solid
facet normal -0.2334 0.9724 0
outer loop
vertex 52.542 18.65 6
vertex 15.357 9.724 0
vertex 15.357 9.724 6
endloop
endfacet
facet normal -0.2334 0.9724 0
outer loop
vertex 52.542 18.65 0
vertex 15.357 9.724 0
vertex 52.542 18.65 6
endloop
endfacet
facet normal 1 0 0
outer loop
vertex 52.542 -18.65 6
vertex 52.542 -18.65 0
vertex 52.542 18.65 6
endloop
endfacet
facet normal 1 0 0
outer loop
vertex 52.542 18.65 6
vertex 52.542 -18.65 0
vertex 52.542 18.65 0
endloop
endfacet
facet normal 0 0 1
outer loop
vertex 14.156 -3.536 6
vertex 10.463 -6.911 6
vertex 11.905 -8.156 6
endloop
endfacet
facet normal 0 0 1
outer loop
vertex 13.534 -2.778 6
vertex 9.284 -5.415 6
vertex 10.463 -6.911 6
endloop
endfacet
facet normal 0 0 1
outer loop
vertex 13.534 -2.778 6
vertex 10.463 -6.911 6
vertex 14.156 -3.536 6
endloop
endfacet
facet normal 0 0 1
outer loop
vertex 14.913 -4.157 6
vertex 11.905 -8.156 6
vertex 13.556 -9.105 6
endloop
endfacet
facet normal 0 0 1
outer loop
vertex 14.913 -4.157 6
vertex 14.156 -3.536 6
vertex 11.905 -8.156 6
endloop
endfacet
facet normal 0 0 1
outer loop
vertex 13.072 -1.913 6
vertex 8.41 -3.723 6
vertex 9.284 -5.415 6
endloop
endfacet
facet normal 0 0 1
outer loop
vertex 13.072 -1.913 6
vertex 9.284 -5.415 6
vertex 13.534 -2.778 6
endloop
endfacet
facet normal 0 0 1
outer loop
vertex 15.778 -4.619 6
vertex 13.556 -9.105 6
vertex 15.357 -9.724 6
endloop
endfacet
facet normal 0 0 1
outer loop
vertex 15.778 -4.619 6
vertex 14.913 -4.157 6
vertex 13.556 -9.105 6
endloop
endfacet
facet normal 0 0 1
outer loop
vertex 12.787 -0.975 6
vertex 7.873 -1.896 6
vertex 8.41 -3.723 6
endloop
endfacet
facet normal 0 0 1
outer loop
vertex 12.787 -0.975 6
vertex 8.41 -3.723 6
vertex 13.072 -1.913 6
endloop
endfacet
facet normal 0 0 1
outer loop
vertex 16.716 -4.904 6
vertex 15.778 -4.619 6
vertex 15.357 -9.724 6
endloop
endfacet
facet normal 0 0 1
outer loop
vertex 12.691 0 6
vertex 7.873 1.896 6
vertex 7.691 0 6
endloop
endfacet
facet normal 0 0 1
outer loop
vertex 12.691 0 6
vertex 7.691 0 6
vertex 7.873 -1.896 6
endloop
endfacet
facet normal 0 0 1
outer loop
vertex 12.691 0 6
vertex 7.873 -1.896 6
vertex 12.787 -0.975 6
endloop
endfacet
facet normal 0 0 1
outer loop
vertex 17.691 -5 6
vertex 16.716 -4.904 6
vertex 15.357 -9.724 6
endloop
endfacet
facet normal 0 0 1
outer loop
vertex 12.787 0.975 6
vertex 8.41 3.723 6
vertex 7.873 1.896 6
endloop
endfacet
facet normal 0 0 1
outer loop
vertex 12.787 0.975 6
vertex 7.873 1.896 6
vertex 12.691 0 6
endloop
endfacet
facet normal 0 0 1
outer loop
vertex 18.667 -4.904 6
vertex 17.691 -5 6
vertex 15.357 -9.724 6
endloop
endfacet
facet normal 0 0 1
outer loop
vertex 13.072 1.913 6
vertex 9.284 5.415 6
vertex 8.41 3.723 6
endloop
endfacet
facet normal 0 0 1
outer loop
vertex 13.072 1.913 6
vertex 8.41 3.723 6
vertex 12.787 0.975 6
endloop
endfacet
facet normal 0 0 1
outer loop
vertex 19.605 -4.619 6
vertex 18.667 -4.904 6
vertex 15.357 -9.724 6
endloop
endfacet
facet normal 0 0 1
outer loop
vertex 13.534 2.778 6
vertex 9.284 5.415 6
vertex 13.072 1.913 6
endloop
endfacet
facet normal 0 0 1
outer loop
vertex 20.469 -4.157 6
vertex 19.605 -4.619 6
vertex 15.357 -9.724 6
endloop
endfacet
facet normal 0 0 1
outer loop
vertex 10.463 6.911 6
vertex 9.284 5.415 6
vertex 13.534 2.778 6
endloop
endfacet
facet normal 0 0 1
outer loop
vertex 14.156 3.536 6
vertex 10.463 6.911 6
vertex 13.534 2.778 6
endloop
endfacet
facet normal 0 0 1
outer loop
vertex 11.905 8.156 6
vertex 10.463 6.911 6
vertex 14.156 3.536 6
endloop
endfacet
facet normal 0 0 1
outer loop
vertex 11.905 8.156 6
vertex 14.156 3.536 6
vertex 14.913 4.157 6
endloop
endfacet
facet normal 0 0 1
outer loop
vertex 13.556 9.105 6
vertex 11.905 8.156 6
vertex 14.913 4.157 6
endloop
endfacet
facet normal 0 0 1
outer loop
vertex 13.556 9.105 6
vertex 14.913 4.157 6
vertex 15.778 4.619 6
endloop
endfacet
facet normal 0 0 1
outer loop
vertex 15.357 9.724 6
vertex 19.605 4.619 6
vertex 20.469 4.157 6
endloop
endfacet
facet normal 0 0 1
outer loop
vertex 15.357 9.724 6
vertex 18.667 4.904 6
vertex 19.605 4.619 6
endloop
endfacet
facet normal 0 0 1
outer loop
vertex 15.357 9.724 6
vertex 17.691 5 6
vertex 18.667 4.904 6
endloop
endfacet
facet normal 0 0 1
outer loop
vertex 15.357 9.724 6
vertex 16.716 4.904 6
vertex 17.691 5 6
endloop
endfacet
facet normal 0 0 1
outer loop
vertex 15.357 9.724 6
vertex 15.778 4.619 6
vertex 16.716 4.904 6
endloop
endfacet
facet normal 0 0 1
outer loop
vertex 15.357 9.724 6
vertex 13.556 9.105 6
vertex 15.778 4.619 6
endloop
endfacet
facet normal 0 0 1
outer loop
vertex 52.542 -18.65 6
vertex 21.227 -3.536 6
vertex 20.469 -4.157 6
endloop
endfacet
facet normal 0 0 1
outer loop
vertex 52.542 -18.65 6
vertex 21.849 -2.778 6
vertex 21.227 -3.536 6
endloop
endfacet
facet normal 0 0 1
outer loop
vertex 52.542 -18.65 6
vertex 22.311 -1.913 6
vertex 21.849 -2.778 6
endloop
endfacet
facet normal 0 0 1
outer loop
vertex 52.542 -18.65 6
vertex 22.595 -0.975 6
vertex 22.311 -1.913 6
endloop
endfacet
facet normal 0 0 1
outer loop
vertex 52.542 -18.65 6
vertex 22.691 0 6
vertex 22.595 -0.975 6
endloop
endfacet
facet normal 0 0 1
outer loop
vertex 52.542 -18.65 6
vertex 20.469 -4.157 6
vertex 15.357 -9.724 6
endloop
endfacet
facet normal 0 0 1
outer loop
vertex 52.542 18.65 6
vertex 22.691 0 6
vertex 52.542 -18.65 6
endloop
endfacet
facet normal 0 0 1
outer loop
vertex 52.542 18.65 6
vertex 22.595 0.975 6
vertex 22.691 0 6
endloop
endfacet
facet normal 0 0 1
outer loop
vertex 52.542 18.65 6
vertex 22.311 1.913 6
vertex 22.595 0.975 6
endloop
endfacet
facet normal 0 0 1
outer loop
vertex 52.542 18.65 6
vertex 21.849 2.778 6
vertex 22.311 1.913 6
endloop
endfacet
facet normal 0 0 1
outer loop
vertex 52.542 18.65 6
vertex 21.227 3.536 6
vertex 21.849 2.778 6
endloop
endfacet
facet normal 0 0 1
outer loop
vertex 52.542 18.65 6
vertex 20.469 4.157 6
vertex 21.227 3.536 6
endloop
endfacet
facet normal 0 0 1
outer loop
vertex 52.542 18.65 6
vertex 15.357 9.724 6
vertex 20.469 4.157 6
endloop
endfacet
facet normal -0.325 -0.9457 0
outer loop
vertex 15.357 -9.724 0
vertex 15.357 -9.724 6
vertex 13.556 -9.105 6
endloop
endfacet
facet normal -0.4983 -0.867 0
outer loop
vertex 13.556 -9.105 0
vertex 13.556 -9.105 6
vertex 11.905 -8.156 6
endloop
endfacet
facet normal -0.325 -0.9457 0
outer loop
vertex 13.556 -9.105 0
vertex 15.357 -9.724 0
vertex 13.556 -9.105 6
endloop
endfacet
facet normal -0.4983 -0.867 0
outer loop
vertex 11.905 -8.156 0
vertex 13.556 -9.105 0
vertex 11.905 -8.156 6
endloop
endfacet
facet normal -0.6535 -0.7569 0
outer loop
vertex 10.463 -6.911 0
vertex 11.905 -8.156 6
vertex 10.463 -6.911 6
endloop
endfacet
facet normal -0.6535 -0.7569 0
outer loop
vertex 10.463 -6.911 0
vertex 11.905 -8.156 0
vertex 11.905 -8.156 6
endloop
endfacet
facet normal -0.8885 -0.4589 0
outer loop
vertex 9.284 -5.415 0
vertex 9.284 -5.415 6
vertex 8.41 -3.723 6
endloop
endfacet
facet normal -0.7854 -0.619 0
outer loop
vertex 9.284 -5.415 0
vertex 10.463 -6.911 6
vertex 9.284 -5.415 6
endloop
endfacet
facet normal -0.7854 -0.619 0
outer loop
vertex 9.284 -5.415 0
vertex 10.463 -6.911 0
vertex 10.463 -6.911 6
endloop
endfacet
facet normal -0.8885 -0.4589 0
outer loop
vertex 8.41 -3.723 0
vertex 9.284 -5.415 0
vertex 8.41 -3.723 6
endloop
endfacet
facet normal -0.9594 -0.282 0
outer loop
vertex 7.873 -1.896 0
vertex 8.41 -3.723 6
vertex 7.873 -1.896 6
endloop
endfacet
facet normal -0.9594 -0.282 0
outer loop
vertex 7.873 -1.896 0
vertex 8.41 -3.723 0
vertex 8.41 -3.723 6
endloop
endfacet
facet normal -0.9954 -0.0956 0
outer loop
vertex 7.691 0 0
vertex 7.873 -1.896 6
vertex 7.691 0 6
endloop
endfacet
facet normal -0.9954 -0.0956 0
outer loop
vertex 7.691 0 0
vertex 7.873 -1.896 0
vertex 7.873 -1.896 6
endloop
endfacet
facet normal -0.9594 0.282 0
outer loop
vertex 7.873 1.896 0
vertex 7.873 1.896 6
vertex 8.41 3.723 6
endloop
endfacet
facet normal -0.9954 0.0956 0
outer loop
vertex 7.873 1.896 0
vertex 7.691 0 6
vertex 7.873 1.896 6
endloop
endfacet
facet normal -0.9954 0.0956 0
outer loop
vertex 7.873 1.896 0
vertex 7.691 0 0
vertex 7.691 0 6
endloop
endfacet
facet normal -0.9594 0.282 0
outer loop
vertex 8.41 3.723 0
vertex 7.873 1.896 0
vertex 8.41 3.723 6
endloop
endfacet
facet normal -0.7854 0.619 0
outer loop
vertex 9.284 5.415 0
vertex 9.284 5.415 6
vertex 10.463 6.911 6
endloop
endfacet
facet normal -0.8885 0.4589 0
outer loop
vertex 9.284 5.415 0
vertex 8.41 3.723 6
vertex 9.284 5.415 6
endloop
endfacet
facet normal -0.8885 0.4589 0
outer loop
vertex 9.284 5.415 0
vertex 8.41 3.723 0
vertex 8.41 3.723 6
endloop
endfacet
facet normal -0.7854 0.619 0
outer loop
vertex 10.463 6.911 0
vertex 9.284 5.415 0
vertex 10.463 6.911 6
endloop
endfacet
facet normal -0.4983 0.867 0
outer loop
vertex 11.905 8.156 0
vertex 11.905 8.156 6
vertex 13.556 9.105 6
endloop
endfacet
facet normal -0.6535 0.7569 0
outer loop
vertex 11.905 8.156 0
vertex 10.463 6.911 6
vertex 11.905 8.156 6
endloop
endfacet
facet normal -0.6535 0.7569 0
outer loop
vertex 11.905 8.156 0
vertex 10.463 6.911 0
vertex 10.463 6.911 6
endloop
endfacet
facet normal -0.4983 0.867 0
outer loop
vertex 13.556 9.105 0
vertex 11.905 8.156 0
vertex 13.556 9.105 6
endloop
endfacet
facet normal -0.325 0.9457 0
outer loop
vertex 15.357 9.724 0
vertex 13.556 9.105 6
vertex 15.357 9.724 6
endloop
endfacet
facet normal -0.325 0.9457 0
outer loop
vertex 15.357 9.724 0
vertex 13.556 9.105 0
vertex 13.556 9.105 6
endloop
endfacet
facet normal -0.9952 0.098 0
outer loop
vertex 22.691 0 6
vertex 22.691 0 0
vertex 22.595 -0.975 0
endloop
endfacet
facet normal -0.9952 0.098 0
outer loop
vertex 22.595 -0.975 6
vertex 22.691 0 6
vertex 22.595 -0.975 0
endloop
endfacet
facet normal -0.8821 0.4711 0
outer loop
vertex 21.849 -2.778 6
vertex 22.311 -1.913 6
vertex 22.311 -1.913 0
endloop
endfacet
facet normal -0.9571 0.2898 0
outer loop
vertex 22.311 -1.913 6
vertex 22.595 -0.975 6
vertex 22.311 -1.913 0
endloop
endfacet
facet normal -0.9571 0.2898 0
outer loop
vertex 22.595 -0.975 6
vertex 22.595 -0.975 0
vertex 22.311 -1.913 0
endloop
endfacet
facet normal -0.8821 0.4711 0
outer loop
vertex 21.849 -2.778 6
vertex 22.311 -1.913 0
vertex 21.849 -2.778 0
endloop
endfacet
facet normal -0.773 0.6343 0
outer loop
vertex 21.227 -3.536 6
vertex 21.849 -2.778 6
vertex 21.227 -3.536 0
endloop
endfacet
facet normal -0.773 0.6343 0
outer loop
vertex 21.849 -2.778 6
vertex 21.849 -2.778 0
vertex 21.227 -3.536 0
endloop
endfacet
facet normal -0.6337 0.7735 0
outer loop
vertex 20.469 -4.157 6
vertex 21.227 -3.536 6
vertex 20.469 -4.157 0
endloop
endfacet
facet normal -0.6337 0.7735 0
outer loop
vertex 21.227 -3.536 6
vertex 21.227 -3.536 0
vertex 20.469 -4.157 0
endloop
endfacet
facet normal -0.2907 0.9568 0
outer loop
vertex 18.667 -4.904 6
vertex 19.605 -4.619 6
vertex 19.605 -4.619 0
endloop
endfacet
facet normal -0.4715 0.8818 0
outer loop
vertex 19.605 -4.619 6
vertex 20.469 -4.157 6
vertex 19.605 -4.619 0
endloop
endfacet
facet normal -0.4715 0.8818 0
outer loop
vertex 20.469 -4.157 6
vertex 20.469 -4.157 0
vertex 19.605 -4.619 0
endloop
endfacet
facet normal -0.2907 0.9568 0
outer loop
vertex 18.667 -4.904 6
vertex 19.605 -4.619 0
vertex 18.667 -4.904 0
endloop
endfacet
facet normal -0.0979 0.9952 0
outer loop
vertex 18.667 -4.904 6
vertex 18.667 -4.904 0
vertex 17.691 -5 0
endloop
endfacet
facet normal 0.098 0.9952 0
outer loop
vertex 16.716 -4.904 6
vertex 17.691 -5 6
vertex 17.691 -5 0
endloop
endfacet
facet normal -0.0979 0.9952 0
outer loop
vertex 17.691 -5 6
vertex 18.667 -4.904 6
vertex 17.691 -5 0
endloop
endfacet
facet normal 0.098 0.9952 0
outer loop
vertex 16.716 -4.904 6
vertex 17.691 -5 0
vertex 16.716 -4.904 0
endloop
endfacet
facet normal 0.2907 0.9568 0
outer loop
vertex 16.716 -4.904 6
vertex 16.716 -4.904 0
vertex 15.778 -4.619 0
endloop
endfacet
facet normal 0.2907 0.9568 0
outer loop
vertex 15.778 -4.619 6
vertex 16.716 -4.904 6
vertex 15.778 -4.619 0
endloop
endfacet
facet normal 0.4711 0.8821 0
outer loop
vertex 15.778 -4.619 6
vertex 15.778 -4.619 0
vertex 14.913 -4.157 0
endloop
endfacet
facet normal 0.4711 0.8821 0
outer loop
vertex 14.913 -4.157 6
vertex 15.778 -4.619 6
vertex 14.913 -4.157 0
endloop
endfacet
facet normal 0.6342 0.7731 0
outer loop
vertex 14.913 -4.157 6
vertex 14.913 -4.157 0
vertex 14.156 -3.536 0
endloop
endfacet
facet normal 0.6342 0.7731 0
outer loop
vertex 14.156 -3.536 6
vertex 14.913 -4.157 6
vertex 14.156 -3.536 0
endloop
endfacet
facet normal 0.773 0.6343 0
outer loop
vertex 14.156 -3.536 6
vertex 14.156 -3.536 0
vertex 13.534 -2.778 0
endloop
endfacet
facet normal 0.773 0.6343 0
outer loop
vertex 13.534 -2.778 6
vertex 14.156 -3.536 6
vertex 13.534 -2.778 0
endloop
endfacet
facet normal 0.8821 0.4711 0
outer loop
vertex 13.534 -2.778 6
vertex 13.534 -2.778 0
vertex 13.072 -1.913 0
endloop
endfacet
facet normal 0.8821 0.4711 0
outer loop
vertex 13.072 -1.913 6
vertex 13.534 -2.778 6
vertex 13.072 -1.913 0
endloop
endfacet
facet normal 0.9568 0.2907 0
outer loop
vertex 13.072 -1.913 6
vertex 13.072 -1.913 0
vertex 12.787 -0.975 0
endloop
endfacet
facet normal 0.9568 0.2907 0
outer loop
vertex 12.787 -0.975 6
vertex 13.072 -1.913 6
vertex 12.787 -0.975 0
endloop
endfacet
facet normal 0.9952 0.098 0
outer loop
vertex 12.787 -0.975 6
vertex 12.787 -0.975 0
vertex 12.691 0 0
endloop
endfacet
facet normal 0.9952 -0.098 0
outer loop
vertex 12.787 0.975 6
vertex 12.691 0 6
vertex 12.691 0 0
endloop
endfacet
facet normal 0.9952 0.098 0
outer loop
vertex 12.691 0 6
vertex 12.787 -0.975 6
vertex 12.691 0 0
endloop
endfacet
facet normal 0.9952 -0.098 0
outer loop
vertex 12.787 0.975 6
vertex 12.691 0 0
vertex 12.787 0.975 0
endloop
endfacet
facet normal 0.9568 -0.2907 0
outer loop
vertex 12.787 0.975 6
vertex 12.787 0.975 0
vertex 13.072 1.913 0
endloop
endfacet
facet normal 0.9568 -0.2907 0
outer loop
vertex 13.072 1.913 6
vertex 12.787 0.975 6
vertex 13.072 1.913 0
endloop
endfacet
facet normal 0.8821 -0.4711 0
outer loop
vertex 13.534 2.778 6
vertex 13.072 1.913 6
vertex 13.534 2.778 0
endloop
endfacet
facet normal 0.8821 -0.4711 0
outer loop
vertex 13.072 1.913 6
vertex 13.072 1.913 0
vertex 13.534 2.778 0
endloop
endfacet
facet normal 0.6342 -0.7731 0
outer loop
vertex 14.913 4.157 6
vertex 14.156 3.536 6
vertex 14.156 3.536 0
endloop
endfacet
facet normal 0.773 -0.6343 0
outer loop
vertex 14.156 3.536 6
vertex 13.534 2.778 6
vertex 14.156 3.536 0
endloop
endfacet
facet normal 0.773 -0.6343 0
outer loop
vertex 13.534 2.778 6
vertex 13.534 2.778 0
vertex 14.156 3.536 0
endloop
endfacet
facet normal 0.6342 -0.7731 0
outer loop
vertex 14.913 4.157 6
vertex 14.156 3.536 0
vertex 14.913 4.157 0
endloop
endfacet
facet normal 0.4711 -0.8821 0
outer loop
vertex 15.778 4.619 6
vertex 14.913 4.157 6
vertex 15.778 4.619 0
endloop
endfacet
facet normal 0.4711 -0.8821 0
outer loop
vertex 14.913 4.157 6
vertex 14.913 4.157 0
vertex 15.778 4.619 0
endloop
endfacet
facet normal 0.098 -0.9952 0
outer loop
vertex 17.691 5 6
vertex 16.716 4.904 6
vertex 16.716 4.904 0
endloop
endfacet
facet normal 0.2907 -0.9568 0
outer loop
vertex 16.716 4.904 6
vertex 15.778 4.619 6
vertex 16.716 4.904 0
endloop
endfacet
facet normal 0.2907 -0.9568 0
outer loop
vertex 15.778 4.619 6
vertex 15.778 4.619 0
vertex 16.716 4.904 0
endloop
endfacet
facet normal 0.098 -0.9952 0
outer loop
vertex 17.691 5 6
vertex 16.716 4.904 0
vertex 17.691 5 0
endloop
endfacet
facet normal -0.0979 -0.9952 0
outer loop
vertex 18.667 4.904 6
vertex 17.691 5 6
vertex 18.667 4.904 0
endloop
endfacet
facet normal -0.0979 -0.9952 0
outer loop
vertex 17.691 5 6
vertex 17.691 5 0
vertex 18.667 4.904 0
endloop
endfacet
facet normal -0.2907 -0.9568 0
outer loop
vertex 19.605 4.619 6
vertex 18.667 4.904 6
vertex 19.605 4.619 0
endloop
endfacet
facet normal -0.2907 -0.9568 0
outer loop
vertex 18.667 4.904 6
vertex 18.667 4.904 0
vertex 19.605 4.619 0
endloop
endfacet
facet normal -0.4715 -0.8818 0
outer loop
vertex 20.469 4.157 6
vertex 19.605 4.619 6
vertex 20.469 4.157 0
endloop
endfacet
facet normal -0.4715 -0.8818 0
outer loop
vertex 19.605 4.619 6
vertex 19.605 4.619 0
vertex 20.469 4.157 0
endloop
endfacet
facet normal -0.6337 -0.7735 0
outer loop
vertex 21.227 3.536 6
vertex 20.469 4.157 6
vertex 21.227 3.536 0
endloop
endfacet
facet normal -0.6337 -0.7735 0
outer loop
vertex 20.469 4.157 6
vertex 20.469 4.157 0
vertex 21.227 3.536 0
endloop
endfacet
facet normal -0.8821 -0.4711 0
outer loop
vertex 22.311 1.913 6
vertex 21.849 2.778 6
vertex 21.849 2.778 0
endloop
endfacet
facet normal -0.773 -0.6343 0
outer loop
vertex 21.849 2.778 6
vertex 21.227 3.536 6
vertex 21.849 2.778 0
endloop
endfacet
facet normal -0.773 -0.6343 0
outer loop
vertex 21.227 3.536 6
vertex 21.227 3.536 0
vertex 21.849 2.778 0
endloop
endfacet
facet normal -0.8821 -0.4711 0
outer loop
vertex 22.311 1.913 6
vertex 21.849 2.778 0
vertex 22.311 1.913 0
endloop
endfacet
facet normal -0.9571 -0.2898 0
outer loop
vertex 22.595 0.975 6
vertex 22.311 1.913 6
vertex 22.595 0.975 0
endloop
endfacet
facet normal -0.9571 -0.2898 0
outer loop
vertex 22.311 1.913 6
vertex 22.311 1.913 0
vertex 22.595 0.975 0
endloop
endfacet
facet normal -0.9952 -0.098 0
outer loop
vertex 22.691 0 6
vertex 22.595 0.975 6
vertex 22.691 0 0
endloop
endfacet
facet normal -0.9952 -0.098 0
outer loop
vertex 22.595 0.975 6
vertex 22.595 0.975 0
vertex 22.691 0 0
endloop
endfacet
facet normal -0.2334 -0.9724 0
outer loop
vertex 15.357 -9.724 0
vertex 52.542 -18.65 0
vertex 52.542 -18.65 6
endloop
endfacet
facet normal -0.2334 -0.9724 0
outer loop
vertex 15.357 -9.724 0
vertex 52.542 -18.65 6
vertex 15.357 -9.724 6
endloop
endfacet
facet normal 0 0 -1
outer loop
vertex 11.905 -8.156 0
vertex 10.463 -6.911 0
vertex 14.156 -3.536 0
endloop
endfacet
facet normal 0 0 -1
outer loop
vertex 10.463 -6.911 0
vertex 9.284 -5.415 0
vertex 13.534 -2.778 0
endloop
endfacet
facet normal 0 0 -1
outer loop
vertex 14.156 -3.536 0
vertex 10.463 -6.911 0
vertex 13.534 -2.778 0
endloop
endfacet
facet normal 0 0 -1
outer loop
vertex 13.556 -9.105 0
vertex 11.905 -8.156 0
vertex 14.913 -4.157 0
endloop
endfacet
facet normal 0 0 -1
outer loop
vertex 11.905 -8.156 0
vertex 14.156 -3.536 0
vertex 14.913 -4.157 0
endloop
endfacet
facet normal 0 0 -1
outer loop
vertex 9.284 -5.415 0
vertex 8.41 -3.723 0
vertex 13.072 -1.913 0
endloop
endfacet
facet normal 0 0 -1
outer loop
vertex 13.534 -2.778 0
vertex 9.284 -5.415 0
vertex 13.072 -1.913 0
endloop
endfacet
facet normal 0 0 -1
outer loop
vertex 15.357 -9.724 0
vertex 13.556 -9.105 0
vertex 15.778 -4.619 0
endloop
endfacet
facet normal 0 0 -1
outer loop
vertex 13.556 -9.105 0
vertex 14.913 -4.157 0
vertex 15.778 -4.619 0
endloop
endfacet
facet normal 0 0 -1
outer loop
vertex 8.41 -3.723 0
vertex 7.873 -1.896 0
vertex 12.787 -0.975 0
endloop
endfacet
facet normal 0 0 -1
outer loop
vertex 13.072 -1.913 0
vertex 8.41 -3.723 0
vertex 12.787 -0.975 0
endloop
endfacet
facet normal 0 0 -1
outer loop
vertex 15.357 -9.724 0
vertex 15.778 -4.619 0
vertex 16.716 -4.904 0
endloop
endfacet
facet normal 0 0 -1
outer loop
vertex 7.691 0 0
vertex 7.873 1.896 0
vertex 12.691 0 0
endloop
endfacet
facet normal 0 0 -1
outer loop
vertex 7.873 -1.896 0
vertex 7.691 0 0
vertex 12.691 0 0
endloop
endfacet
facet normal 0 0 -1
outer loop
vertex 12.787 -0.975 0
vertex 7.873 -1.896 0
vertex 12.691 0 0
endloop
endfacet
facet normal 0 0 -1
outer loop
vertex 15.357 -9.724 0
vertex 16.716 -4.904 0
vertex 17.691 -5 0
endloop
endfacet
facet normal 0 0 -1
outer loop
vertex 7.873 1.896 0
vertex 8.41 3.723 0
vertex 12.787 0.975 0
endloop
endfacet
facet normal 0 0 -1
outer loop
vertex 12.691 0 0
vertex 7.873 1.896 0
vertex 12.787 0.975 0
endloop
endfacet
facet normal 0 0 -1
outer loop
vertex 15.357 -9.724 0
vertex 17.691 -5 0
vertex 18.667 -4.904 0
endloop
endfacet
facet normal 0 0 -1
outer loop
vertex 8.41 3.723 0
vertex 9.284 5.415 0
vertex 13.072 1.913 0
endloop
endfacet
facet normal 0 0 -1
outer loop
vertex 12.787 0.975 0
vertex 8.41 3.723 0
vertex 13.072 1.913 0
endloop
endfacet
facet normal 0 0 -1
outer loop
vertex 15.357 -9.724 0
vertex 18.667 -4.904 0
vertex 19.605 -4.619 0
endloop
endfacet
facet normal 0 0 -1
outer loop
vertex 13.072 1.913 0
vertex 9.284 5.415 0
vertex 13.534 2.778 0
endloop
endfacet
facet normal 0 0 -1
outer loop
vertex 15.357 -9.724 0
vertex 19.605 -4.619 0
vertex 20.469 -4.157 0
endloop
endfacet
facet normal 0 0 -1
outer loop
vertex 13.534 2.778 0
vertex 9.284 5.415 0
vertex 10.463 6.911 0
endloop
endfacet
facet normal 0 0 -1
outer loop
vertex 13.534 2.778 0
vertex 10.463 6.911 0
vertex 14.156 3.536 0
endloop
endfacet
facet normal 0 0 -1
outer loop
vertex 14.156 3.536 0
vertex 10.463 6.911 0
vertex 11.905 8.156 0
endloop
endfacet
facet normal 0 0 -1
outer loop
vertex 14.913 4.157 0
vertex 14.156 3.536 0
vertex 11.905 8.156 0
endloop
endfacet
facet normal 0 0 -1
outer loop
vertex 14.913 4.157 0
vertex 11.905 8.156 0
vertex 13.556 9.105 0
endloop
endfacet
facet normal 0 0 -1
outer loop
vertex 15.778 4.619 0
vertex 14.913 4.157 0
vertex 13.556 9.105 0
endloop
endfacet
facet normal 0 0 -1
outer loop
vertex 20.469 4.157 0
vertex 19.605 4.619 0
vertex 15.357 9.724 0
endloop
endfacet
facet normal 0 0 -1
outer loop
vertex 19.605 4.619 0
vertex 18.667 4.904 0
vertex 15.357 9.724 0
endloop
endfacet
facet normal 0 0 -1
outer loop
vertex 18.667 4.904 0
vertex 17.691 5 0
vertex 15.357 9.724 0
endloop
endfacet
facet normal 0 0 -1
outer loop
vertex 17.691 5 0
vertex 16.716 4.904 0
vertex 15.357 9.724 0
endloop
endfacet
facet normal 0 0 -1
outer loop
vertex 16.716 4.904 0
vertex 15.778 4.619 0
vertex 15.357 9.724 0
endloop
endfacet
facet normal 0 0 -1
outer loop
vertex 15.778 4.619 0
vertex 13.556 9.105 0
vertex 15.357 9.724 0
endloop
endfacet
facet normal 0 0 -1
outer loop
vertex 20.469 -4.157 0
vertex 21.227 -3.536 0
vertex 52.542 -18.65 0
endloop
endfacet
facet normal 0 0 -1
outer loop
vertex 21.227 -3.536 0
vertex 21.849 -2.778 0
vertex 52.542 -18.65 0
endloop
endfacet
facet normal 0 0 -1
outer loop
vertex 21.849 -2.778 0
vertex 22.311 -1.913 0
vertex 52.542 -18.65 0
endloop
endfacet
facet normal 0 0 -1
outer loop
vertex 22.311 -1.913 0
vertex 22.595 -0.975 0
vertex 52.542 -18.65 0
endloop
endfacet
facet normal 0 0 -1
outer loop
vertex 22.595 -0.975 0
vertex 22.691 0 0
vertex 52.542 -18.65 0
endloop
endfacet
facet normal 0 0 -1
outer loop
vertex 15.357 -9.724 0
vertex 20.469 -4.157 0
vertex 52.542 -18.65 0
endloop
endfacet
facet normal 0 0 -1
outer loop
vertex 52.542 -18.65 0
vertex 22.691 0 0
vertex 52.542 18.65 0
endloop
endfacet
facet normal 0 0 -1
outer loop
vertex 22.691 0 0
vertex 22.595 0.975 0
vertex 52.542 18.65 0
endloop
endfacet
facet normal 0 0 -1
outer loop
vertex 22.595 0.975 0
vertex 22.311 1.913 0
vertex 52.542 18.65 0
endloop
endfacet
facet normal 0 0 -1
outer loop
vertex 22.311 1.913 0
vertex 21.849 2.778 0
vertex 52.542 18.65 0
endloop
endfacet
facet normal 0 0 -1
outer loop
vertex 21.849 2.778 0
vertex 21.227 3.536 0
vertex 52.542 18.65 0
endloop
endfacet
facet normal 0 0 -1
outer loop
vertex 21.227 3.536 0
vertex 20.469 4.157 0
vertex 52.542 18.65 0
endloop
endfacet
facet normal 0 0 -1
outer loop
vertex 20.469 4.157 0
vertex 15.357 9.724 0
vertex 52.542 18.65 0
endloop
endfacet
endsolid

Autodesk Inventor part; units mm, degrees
ref_plane "YZ Plane" through (0, 0, 0) normal (1, 0, 0) x (0, 1, 0)
ref_plane "XZ Plane" through (0, 0, 0) normal (0, 1, 0) x (-1, 0, 0)
ref_plane "XY Plane" through (0, 0, 0) normal (0, 0, 1) x (1, 0, 0)
sketch "Sketch1" plane through (0, 0, 0) normal (0, 0, 1) x (1, 0, 0)
  circle A0 centre (-790.1228, -10.9134) radius 9.525 projected
  ellipse E0 centre (61.5218, 18.65) end of major axis (52.5416, 18.65) minor radius 6.35 (61.5218, 25) -> (52.5416, 18.65) ccw
  line L0 (61.5218, 25) -> (114.272, 25)
  ellipse E1 centre (114.272, 18.65) end of major axis (105.2917, 18.65) minor radius 6.35 (123.2522, 18.65) -> (114.272, 25) ccw
  line L1 (123.2522, 18.65) -> (123.2522, -18.65)
  ellipse E2 centre (114.272, -18.65) end of major axis (105.2917, -18.65) minor radius 6.35 (114.272, -25) -> (123.2522, -18.65) ccw
  line L2 (114.272, -25) -> (61.5218, -25)
  ellipse E3 centre (61.5218, -18.65) end of major axis (52.5416, -18.65) minor radius 6.35 (52.5416, -18.65) -> (61.5218, -25) ccw
  line L3 (52.5416, -18.65) -> (52.5416, 18.65)
  line L4 (114.272, 21.825) -> (61.5218, 21.825)
  ellipse E4 centre (61.5218, 18.65) end of major axis (57.0317, 18.65) minor radius 3.175 (61.5218, 21.825) -> (57.0317, 18.65) ccw
  line L5 (57.0317, 18.65) -> (57.0317, -18.65)
  ellipse E5 centre (61.5218, -18.65) end of major axis (57.0317, -18.65) minor radius 3.175 (57.0317, -18.65) -> (61.5218, -21.825) ccw
  line L6 (61.5218, -21.825) -> (114.272, -21.825)
  ellipse E6 centre (114.272, -18.65) end of major axis (109.7818, -18.65) minor radius 3.175 (114.272, -21.825) -> (118.7621, -18.65) ccw
  line L7 (118.7621, -18.65) -> (118.7621, 18.65)
  ellipse E7 centre (114.272, 18.65) end of major axis (109.7818, 18.65) minor radius 3.175 (118.7621, 18.65) -> (114.272, 21.825) ccw
  circle A1 centre (17.6912, 0) radius 5 projected
  circle A2 centre (17.6912, 0) radius 10
  line L8 (15.357, 9.7238) -> (52.5416, 18.65)
  line L9 (52.5416, -18.65) -> (15.357, -9.7238)
  dimension "d4" = 20
extrude "Extrusion1" add sketch "Sketch1" along normal blind 6 contours L3 L9 A2 L8 | A2
properties part number "Soporte pivote freno"
